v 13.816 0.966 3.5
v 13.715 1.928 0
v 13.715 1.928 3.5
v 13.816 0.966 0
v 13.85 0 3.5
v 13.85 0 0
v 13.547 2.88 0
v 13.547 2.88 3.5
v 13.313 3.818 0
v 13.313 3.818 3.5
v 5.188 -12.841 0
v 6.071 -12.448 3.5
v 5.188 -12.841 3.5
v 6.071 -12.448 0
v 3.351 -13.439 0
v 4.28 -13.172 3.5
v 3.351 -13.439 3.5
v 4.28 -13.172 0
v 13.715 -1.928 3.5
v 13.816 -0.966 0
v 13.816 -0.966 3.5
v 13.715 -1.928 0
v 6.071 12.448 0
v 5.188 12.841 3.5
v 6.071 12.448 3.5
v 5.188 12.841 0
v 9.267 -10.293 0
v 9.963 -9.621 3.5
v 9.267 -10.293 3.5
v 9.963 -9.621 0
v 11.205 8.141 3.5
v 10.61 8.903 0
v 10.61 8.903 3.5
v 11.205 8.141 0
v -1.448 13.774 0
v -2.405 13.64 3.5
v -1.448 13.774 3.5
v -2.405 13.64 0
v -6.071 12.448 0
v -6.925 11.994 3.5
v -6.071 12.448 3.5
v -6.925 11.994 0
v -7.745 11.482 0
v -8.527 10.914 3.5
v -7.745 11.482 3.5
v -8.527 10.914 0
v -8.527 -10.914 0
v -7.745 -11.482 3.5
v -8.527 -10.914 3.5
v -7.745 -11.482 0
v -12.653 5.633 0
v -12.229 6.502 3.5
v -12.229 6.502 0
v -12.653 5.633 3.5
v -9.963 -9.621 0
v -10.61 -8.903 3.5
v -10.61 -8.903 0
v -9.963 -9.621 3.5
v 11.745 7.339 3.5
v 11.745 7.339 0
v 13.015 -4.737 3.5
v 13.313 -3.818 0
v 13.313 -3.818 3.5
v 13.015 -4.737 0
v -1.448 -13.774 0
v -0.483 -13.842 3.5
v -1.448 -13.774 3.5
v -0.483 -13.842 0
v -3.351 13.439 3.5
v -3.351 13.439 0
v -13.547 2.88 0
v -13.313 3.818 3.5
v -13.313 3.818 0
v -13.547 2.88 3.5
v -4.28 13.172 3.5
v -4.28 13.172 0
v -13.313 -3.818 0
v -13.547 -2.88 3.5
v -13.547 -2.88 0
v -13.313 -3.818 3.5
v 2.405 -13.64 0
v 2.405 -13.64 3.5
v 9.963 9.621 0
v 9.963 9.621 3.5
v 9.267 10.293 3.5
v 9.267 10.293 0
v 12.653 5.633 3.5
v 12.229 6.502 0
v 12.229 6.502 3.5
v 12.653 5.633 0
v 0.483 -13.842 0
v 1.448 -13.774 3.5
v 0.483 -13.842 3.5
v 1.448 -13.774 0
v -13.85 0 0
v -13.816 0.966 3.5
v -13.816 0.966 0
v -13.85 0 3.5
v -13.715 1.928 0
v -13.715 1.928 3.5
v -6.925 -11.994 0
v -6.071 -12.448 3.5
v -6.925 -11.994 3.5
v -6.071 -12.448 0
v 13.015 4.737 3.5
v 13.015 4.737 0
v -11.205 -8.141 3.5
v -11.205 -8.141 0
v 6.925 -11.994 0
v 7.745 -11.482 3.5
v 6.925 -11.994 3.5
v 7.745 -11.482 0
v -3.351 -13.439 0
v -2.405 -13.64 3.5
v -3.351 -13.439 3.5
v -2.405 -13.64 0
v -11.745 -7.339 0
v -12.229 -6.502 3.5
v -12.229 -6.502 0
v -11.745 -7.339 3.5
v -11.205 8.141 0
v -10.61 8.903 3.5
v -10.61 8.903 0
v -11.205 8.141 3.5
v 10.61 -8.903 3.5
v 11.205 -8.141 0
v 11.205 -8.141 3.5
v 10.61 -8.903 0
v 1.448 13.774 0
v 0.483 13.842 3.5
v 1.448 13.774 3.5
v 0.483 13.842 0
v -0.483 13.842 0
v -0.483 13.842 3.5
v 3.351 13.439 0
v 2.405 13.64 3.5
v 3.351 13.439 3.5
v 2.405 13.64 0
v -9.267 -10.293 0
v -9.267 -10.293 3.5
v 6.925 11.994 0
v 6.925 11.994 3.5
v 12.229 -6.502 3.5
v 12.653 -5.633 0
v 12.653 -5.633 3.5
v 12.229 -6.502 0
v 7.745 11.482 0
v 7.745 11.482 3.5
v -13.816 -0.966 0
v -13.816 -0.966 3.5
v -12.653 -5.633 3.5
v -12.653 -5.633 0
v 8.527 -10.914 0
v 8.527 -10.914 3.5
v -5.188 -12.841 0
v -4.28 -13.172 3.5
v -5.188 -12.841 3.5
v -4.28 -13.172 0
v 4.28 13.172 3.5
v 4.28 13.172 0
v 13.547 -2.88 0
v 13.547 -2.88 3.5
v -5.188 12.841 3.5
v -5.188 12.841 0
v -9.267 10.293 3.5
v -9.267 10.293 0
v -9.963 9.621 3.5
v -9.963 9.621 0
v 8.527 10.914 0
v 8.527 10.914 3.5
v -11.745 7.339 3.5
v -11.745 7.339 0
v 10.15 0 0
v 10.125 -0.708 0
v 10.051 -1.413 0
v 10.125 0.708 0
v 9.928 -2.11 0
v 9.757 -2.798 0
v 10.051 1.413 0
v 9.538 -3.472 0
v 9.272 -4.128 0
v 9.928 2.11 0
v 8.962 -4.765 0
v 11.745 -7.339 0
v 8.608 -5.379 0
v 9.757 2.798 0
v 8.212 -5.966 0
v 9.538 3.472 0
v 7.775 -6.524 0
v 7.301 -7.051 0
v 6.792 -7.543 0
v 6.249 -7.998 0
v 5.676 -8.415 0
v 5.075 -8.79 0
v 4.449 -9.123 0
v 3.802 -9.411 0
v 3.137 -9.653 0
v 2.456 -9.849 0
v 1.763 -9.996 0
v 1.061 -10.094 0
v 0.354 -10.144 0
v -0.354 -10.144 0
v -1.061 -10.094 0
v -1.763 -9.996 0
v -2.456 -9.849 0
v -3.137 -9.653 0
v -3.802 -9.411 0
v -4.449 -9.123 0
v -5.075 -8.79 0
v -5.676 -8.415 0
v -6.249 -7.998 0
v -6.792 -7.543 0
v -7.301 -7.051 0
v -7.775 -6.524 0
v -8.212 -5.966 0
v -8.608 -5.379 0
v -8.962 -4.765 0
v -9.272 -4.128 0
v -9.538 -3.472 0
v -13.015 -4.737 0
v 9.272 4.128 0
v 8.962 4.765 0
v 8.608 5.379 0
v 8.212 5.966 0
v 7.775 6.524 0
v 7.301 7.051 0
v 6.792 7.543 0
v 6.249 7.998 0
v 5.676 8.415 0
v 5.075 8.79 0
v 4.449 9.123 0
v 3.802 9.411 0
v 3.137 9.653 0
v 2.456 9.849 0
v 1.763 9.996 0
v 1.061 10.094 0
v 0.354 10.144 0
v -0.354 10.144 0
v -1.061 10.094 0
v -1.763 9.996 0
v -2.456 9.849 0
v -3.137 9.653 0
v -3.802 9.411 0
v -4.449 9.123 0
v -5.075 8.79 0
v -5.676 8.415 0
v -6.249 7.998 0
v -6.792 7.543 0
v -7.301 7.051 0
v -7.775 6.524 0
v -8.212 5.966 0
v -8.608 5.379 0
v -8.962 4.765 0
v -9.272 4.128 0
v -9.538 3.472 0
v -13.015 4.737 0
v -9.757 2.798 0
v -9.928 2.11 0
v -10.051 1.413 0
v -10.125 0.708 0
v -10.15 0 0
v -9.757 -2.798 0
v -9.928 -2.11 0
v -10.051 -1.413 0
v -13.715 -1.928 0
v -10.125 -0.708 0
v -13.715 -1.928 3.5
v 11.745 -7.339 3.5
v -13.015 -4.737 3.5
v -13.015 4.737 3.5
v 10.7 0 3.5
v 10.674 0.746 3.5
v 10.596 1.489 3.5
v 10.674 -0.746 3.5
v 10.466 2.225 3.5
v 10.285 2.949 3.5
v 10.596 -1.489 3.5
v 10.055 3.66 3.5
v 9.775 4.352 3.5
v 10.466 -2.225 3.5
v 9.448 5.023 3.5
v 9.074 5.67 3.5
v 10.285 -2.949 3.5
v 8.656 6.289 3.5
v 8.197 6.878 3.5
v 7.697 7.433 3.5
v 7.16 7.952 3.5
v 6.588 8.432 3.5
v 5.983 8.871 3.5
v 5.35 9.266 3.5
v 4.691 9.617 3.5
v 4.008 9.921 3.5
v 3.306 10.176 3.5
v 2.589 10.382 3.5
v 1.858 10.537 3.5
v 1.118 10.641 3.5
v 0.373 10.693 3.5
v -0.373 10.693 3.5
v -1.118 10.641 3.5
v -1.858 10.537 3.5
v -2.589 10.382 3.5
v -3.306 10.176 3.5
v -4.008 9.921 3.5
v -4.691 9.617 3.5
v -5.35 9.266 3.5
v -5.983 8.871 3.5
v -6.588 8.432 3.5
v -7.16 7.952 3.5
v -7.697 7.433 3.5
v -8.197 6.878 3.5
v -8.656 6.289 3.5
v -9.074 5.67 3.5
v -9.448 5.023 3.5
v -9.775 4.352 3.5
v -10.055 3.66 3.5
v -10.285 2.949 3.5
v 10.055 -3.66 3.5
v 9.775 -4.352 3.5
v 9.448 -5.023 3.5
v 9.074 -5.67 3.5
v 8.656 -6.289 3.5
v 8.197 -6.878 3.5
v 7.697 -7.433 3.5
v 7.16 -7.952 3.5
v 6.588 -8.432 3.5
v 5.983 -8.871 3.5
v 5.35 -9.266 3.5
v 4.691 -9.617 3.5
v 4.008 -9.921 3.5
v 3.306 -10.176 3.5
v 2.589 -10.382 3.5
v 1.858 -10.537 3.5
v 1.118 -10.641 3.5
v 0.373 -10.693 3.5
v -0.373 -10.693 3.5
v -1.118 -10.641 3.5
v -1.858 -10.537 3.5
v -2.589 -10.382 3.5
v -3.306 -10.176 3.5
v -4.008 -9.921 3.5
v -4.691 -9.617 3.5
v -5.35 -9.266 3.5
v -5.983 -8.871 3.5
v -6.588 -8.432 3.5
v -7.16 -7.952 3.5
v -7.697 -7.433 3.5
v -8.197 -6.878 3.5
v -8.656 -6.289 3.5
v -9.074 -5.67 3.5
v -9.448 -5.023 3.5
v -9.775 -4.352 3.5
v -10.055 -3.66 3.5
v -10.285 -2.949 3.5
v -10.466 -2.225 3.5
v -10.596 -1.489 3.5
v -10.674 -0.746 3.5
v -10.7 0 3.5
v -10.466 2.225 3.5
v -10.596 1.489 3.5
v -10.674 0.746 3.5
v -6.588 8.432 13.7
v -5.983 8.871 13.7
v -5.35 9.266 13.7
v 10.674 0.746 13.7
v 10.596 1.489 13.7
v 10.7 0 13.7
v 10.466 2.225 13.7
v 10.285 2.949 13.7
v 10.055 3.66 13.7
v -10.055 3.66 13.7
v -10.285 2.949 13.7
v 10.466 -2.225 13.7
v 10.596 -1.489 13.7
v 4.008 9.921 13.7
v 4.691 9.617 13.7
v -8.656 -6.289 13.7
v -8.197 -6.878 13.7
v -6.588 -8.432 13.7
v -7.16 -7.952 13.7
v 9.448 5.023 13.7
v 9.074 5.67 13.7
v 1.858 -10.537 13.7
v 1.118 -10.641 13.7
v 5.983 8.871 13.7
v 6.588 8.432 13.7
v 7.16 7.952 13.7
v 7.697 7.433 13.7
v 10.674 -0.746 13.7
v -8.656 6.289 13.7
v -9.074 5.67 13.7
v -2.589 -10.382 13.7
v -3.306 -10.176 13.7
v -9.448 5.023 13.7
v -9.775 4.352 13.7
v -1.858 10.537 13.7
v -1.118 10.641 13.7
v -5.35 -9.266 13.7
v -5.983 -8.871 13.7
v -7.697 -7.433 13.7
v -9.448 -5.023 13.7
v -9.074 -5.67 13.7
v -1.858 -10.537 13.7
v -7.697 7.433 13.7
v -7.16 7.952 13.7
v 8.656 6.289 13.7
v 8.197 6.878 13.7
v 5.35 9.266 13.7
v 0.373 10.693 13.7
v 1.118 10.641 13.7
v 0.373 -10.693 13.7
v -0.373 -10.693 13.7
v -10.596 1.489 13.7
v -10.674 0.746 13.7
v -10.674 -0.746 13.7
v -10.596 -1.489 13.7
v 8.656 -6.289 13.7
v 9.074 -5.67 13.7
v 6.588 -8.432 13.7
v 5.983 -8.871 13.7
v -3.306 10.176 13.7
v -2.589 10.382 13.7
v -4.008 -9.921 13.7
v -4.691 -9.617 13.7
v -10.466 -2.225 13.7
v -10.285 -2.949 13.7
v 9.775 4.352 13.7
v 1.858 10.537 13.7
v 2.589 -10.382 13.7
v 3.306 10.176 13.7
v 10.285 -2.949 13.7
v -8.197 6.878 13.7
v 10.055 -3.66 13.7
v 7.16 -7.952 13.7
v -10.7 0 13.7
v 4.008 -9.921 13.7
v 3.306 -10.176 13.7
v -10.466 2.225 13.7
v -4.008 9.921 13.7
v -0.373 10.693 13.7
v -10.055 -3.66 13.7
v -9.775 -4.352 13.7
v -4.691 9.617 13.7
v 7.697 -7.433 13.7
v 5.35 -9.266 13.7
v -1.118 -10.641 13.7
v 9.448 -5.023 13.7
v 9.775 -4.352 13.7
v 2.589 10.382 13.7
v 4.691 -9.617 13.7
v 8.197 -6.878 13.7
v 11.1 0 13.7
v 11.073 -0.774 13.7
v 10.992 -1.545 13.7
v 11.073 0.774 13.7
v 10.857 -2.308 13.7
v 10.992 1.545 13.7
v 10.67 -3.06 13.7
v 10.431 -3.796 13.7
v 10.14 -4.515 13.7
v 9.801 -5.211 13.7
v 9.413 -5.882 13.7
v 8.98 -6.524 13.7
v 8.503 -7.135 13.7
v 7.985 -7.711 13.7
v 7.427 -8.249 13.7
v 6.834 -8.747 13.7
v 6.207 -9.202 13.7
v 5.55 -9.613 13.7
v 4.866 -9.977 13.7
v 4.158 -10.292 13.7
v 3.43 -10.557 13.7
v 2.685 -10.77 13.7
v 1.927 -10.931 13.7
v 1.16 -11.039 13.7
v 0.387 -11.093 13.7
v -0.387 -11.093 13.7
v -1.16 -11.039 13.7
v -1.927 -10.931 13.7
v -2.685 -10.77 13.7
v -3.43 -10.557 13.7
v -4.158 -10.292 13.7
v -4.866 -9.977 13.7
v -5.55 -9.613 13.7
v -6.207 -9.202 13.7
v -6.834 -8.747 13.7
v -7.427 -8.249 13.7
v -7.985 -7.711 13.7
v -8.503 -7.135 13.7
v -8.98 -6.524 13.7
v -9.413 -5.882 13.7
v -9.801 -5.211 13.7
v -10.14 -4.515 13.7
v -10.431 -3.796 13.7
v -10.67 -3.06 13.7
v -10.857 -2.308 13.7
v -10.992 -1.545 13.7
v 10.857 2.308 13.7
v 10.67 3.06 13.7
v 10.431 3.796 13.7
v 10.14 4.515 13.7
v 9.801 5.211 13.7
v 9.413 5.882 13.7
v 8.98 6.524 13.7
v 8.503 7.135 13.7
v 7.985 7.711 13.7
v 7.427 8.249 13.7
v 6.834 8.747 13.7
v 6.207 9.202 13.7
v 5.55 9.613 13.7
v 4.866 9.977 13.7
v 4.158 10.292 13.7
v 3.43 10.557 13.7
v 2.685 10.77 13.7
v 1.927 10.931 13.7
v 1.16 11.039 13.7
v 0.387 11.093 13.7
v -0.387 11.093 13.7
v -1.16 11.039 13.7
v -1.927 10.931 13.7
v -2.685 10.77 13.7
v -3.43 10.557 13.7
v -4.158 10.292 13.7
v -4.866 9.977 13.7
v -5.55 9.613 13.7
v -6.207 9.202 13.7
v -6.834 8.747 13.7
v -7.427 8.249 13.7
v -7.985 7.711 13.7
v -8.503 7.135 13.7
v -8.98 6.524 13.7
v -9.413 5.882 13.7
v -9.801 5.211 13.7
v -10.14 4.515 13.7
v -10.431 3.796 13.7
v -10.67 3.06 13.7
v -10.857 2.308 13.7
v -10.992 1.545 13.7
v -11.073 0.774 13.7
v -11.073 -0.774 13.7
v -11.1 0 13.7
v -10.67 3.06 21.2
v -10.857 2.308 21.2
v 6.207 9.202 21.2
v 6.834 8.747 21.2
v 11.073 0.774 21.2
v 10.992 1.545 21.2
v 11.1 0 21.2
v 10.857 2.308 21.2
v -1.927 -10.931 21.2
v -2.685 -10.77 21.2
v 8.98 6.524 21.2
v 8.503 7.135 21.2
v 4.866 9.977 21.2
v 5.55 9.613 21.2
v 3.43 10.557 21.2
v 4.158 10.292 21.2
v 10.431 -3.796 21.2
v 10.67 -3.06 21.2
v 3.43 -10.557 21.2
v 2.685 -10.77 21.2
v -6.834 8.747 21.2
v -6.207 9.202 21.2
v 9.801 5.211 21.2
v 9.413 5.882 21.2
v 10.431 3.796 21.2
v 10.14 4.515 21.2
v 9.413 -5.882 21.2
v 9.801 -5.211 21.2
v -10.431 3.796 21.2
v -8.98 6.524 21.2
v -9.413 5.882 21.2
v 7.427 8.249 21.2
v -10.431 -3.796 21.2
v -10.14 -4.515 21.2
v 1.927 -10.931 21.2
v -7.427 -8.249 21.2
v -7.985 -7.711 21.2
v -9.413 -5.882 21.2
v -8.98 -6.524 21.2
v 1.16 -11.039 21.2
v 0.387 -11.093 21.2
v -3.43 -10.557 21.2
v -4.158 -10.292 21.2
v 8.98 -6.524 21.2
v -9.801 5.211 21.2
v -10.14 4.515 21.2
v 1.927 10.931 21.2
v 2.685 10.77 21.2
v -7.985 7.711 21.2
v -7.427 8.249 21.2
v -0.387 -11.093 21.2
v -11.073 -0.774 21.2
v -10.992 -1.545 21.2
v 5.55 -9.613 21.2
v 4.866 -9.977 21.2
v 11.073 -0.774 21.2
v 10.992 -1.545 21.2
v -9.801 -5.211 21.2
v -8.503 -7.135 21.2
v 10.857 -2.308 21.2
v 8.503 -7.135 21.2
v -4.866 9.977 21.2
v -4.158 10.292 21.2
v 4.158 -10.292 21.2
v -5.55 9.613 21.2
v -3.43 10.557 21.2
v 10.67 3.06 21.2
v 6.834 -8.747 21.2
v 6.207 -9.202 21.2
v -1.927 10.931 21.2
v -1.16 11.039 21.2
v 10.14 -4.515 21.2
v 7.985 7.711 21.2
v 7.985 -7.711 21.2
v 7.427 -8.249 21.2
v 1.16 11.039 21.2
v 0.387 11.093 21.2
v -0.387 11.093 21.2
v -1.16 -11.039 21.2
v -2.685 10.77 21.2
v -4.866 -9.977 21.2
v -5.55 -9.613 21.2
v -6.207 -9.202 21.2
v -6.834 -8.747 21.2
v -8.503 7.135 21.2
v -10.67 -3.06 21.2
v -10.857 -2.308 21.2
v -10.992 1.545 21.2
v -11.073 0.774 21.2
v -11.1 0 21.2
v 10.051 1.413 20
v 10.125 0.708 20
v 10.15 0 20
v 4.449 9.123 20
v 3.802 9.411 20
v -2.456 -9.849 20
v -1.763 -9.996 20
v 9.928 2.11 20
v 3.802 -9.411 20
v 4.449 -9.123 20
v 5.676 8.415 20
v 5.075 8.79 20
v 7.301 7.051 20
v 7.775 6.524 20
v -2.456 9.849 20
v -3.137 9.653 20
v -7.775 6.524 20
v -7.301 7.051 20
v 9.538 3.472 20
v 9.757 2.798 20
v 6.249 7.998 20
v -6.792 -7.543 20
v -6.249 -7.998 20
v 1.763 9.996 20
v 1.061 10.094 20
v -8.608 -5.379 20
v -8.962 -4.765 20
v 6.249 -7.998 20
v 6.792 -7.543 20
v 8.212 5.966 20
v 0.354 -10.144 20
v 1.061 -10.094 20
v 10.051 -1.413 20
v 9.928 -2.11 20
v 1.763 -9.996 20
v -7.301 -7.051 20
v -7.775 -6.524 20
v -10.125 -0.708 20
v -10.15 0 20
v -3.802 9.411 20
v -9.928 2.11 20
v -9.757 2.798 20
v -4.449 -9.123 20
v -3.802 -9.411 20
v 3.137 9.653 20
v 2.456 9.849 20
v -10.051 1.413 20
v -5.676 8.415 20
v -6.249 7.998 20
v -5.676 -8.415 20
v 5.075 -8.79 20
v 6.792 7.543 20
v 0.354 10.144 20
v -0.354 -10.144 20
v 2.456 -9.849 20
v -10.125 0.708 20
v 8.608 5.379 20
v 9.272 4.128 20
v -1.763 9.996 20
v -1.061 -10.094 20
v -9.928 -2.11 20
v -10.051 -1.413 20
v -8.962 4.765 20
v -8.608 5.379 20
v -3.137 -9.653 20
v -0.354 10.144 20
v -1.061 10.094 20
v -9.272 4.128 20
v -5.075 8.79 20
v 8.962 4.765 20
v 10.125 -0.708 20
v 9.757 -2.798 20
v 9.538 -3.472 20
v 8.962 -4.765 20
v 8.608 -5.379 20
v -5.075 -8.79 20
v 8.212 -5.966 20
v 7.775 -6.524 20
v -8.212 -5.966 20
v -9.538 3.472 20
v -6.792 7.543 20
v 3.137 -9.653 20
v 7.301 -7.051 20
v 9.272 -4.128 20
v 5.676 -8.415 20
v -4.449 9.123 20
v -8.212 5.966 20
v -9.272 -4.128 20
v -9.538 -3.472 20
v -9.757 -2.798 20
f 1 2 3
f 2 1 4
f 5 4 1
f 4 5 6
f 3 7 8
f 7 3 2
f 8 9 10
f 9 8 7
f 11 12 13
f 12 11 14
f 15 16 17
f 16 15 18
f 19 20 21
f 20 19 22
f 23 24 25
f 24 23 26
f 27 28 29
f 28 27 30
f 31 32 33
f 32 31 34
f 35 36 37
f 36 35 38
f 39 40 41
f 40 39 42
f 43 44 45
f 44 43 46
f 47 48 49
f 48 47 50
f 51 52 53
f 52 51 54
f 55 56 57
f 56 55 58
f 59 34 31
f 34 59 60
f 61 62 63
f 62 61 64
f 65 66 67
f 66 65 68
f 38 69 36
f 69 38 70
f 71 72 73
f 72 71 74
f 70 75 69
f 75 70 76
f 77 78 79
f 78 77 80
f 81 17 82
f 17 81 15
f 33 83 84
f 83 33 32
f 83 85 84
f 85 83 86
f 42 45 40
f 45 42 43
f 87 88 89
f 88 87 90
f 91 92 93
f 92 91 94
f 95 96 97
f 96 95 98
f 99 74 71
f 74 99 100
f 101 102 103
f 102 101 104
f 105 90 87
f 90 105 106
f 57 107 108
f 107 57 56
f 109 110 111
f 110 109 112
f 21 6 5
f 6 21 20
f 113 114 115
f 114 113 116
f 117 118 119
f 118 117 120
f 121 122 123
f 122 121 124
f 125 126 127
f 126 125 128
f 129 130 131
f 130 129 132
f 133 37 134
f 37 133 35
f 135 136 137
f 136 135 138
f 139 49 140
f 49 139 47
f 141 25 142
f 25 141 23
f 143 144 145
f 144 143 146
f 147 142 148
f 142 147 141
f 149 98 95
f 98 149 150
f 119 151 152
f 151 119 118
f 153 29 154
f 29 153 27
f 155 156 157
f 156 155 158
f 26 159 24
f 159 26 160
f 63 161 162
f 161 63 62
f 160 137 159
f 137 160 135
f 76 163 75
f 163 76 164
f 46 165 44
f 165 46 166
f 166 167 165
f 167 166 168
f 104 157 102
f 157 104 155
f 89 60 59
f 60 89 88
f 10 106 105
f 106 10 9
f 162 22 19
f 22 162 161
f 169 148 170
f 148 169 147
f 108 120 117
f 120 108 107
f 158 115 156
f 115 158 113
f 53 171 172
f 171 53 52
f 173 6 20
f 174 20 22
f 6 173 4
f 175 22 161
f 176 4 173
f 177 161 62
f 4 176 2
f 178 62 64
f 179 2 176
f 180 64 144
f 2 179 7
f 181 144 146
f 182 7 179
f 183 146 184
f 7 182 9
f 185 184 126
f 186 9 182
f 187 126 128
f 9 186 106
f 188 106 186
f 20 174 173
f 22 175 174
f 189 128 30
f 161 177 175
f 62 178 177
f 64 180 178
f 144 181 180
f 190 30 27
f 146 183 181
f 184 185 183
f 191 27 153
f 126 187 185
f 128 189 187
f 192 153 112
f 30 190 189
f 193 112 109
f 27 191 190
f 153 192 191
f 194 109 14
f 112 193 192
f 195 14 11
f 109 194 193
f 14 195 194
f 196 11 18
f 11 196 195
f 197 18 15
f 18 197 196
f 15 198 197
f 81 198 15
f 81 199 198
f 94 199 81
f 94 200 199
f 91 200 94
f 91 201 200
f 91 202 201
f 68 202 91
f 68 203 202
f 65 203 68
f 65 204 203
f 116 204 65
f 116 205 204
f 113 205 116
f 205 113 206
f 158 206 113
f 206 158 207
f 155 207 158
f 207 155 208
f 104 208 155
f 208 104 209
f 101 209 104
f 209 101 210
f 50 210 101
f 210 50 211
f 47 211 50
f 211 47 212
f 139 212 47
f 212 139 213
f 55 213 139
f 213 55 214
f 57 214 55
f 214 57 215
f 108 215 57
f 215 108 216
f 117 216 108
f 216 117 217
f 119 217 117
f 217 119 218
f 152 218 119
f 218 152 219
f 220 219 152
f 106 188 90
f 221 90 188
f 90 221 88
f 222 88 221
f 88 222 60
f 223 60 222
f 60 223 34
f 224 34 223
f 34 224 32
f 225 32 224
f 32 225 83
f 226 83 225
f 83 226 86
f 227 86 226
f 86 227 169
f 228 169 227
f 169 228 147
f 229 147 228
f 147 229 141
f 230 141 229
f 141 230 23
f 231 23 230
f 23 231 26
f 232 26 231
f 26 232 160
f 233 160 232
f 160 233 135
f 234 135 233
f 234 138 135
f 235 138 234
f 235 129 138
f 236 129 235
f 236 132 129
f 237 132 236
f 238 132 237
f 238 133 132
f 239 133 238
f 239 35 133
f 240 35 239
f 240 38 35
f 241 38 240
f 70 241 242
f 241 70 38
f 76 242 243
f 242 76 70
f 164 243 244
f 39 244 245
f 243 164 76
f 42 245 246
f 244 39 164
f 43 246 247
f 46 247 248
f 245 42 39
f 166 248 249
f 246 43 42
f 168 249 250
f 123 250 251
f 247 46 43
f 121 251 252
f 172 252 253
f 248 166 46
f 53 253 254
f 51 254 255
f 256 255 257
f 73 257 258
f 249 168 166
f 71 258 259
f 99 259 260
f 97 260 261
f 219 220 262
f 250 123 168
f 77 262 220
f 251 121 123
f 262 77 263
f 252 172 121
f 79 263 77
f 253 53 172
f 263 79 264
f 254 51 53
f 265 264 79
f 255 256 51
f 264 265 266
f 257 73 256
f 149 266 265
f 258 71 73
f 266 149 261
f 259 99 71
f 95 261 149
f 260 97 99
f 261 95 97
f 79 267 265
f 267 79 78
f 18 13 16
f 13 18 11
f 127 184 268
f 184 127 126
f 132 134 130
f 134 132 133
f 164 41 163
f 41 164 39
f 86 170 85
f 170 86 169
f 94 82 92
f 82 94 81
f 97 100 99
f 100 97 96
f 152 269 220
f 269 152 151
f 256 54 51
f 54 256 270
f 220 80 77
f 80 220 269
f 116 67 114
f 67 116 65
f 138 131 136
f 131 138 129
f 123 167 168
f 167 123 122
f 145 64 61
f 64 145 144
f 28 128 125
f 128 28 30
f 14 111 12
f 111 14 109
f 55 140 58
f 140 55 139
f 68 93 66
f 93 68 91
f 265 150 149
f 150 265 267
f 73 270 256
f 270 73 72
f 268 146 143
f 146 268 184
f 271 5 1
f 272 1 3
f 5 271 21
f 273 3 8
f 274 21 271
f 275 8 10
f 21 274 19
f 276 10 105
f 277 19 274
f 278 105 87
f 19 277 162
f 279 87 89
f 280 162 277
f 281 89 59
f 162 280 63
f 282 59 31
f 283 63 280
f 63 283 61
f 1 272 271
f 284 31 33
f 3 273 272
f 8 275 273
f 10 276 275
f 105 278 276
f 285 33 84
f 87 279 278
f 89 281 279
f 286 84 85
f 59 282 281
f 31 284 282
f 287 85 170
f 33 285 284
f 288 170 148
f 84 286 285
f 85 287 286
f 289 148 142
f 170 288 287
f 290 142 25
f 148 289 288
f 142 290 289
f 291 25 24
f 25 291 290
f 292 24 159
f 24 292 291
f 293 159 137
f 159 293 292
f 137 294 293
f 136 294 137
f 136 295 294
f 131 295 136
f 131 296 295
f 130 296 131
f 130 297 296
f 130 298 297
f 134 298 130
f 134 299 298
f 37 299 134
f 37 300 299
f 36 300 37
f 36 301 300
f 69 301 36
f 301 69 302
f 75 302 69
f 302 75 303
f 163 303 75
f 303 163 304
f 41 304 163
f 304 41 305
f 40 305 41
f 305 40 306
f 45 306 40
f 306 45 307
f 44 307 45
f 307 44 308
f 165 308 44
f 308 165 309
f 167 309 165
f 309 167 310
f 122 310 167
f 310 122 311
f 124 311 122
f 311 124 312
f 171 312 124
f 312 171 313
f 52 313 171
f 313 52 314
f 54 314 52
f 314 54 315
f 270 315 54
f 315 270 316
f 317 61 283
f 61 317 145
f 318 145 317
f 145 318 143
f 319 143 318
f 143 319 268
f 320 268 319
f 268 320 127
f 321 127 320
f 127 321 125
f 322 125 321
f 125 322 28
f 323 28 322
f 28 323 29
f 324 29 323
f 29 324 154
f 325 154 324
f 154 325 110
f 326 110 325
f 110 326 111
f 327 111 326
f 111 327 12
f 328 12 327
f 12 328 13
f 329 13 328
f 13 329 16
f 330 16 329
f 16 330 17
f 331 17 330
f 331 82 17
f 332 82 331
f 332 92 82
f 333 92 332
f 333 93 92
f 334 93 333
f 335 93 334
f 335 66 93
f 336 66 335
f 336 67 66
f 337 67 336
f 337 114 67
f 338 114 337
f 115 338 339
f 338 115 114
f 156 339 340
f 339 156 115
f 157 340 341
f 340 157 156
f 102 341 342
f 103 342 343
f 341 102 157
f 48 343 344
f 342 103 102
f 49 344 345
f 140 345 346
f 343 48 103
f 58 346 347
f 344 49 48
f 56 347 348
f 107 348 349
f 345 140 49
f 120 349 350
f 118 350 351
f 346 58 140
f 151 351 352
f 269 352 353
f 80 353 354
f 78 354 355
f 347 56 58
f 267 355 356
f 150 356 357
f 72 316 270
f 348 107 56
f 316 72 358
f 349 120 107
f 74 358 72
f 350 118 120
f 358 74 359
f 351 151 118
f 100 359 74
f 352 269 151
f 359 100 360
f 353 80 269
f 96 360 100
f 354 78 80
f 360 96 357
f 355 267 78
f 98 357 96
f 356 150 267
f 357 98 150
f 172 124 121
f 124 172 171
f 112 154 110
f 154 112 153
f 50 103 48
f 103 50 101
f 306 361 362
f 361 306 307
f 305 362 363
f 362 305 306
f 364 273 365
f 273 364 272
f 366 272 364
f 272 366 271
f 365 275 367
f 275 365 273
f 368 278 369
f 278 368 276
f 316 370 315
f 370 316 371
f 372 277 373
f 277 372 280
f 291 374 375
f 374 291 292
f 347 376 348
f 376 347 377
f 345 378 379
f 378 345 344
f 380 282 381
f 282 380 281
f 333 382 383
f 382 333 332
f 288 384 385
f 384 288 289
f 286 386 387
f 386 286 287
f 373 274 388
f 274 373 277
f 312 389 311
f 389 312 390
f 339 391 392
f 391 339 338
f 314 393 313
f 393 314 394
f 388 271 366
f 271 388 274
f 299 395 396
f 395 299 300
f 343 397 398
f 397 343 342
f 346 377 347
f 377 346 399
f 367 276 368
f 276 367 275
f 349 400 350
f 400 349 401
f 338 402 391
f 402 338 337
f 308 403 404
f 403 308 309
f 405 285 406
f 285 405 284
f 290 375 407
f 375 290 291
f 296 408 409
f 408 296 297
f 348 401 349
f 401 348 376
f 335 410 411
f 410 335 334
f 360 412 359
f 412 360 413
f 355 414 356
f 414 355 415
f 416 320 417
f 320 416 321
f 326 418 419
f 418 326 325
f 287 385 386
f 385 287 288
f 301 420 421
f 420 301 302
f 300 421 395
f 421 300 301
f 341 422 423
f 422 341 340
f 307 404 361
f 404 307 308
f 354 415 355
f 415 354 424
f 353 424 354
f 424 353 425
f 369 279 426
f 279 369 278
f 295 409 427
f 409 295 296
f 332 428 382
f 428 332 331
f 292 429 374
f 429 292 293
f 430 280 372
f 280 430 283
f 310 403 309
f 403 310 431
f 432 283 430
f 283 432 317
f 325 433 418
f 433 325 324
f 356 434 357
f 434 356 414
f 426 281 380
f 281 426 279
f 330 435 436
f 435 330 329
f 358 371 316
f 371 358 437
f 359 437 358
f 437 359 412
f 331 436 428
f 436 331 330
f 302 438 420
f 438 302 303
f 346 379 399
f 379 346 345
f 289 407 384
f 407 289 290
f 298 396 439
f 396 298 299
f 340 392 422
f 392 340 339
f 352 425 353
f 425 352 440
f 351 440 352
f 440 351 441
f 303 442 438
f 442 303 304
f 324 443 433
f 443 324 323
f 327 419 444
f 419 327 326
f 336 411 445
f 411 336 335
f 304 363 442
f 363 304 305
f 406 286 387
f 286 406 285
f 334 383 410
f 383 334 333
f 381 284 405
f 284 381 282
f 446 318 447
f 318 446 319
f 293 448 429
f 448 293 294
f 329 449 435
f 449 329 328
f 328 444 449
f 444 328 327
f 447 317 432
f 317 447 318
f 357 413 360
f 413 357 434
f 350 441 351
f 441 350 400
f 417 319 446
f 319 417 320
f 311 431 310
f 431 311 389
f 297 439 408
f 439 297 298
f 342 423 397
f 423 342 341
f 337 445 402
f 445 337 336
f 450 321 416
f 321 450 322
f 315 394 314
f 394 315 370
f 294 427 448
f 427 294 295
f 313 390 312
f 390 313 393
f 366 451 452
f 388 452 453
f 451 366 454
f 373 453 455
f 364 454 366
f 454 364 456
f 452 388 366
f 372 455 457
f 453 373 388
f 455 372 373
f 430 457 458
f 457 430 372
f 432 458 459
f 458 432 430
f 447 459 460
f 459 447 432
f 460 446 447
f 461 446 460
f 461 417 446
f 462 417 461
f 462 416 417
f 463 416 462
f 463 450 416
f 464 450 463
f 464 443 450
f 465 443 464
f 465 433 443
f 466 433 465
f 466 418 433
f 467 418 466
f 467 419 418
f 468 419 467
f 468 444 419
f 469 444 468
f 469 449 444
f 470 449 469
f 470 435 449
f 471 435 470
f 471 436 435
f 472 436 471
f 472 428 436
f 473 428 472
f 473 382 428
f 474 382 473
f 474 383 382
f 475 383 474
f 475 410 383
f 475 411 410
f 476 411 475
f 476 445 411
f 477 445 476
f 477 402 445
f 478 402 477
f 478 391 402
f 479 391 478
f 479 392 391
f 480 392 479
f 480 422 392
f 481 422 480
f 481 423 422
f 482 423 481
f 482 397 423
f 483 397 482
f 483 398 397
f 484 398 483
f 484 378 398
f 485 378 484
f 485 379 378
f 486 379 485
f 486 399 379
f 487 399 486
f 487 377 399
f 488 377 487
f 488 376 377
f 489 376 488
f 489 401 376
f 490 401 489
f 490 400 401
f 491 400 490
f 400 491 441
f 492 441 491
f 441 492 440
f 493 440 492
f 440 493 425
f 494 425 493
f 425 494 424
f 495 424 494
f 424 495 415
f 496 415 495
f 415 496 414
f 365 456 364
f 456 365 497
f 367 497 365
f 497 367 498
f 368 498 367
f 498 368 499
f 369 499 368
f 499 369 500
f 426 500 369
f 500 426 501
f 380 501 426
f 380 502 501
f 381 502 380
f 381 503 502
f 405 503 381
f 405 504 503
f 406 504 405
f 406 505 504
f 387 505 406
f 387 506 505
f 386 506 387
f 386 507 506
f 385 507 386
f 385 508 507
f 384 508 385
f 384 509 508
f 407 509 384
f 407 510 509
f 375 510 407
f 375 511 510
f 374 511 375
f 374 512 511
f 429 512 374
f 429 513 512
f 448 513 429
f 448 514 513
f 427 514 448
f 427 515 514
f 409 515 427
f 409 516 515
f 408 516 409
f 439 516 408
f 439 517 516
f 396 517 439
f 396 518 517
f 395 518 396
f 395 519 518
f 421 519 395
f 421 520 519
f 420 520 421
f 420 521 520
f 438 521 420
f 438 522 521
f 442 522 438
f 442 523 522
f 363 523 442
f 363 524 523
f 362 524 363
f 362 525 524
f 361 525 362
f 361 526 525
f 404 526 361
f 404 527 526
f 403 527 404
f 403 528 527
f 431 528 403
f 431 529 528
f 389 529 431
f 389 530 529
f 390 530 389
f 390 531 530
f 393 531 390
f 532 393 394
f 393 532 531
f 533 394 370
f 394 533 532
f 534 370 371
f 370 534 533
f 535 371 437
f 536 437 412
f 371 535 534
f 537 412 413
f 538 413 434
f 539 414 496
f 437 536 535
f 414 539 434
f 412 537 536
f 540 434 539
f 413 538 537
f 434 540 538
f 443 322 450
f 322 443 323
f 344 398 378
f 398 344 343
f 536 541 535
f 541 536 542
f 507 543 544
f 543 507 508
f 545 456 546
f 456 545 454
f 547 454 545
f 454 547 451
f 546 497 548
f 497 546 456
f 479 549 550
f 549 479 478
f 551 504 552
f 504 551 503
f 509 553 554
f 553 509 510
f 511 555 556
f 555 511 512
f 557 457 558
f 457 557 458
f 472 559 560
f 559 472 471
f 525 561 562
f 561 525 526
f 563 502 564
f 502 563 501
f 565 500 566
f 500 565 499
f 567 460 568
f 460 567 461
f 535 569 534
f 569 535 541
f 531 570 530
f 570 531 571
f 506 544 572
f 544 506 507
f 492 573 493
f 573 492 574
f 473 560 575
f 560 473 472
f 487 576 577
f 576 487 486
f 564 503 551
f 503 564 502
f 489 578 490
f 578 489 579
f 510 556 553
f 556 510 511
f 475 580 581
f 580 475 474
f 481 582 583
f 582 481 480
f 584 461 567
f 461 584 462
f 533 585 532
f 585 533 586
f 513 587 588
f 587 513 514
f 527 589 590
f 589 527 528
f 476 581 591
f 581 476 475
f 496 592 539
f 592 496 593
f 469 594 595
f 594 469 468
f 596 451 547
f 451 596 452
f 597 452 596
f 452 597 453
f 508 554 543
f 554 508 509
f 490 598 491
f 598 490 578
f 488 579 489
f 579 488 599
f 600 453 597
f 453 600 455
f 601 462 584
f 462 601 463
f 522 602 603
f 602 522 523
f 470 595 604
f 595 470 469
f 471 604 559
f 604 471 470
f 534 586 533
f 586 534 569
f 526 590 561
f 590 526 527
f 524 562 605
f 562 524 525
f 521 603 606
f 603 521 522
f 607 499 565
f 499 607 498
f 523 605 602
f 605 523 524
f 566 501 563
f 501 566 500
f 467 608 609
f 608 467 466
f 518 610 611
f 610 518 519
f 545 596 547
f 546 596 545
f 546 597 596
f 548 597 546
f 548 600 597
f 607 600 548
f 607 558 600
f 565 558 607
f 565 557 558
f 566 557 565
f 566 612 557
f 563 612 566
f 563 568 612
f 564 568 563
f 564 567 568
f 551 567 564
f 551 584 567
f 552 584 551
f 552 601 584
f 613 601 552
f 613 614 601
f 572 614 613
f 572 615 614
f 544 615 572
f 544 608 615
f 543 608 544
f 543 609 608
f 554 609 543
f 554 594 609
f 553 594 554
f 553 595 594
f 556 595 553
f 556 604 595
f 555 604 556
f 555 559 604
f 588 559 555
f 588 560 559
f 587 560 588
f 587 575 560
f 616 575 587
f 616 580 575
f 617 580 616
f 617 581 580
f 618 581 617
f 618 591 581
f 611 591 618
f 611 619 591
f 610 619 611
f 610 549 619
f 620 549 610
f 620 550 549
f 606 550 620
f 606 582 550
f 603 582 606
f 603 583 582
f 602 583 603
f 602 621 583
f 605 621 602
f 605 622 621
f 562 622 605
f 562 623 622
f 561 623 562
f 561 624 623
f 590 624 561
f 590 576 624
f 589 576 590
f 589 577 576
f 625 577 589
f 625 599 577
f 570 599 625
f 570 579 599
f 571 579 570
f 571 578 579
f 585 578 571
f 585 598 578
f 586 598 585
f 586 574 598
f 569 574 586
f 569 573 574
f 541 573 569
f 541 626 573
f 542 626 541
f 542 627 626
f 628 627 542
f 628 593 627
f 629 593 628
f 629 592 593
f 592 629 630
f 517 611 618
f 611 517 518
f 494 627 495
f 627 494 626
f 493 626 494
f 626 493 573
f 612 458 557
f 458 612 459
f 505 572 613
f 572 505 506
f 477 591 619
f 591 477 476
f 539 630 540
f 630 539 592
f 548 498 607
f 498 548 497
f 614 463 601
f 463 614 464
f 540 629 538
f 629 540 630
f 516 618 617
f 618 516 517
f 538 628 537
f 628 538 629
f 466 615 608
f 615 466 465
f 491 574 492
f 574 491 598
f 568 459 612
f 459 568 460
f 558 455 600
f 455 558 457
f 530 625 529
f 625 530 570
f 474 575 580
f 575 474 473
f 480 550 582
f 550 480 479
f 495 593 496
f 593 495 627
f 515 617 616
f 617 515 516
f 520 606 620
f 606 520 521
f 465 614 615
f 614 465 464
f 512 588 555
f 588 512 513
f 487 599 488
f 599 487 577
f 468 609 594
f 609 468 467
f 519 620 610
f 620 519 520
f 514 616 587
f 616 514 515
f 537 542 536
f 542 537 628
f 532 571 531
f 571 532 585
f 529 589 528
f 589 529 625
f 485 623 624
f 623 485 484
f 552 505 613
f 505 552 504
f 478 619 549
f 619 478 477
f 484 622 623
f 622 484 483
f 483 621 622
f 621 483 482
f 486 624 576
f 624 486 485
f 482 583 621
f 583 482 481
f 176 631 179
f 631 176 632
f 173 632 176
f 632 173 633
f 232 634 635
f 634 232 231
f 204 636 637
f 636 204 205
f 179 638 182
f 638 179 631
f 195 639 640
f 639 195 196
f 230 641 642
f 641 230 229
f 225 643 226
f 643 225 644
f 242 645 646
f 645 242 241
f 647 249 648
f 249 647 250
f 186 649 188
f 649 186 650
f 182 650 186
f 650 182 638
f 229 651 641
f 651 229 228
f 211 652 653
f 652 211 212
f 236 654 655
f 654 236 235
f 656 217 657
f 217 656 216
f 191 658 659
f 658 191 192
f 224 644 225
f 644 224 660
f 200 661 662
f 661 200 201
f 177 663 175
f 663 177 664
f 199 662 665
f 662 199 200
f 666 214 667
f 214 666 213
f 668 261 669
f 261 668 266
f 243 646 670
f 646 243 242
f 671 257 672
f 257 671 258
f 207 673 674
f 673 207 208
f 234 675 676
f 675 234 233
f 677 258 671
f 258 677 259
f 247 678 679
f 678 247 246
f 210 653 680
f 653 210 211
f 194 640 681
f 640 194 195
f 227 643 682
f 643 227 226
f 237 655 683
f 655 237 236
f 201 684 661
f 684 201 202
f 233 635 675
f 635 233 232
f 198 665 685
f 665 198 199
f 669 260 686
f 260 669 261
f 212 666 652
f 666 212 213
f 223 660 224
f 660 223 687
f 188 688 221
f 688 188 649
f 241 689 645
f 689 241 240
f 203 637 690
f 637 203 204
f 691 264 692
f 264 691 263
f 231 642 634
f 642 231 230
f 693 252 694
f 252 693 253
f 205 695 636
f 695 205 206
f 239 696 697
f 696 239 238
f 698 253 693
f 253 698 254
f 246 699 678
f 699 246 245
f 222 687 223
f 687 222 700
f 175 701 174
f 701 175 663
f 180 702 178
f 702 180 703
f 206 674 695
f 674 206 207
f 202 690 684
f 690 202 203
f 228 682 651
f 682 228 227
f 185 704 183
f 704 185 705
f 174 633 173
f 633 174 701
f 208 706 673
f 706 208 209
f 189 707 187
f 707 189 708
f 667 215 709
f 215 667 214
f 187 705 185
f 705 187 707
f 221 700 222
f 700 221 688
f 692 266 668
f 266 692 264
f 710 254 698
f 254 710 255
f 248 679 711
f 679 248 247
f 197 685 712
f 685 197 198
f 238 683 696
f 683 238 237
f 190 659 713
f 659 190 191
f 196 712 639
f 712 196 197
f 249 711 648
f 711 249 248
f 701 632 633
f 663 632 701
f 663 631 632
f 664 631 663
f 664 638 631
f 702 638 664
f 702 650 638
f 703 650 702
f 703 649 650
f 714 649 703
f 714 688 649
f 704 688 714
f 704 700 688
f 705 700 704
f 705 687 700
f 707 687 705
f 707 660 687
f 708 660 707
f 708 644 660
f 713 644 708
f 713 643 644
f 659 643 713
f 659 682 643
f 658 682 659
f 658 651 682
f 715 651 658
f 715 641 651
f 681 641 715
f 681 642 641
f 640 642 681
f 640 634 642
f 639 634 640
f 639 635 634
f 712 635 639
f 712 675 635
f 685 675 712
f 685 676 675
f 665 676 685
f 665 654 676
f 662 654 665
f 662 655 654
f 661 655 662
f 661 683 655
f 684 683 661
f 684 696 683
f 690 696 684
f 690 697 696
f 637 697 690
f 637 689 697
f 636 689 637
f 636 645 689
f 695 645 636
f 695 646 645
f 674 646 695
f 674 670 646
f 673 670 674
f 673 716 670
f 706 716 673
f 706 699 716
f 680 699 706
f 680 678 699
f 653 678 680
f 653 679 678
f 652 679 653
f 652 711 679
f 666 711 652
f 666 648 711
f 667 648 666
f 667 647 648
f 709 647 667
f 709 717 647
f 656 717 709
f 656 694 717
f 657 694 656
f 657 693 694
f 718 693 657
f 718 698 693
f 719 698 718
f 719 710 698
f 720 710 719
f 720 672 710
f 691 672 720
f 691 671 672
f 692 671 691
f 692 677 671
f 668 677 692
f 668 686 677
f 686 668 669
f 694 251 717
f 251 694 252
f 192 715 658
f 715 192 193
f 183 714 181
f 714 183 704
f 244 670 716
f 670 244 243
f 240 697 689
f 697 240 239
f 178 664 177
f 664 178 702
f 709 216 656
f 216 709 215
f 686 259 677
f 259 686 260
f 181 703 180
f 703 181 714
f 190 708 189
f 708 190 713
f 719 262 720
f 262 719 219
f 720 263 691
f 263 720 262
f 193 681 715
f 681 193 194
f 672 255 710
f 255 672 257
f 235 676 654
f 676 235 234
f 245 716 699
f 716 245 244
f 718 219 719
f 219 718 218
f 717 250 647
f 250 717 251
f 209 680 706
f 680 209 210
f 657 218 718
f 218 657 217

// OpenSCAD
$fn=90;
//Durchmesser Knopf Innen
dki=20.3;
//Durchmesser Knopf Aussen Oben
dkao=22.2;
//Durchmesser Knopf Aussen Unten
dkau=21.4;
//Knopf Innen Abstand Schaumstoff
kias=20.0; //23.5 Original, muss aber nicht ganz "rinter"
//Knopf Innen Abstand Wand
kiaw=16.1;
//Knopf Aussen Abstand Blende
kaab=17.7;
//Knopf Aussen Abstand Wand
kaaw=17.3;
//Knopfhoehe Oben
kho=7.5;
//Durchmesser Blende
db=27.7;

//=>
//Dicke Knopf aussen innen oben
dkaio=kaaw-kiaw;
//Dicke (Thickness) Blende
tb=(kias+dkaio)-kaab;

module blende()
{
    cylinder(h=tb,d=db);
}

//Knopfhoehe Unten
khu=kaab-kho;

module knopf_unten()
{
    translate([0,0,tb])
    cylinder(h=khu,d=dkau);
}

module knopf_oben()
{
    translate([0,0,tb+khu])
    cylinder(h=kho,d=dkao);
}

module knopf_massiv()
{
    blende();
    knopf_unten();
    knopf_oben();
}

module knopf_innen()
{
    hki=tb+khu+kho - dkaio;
    cylinder(h=hki,d=dki);
}

difference()
{
    knopf_massiv();
    knopf_innen();
}
